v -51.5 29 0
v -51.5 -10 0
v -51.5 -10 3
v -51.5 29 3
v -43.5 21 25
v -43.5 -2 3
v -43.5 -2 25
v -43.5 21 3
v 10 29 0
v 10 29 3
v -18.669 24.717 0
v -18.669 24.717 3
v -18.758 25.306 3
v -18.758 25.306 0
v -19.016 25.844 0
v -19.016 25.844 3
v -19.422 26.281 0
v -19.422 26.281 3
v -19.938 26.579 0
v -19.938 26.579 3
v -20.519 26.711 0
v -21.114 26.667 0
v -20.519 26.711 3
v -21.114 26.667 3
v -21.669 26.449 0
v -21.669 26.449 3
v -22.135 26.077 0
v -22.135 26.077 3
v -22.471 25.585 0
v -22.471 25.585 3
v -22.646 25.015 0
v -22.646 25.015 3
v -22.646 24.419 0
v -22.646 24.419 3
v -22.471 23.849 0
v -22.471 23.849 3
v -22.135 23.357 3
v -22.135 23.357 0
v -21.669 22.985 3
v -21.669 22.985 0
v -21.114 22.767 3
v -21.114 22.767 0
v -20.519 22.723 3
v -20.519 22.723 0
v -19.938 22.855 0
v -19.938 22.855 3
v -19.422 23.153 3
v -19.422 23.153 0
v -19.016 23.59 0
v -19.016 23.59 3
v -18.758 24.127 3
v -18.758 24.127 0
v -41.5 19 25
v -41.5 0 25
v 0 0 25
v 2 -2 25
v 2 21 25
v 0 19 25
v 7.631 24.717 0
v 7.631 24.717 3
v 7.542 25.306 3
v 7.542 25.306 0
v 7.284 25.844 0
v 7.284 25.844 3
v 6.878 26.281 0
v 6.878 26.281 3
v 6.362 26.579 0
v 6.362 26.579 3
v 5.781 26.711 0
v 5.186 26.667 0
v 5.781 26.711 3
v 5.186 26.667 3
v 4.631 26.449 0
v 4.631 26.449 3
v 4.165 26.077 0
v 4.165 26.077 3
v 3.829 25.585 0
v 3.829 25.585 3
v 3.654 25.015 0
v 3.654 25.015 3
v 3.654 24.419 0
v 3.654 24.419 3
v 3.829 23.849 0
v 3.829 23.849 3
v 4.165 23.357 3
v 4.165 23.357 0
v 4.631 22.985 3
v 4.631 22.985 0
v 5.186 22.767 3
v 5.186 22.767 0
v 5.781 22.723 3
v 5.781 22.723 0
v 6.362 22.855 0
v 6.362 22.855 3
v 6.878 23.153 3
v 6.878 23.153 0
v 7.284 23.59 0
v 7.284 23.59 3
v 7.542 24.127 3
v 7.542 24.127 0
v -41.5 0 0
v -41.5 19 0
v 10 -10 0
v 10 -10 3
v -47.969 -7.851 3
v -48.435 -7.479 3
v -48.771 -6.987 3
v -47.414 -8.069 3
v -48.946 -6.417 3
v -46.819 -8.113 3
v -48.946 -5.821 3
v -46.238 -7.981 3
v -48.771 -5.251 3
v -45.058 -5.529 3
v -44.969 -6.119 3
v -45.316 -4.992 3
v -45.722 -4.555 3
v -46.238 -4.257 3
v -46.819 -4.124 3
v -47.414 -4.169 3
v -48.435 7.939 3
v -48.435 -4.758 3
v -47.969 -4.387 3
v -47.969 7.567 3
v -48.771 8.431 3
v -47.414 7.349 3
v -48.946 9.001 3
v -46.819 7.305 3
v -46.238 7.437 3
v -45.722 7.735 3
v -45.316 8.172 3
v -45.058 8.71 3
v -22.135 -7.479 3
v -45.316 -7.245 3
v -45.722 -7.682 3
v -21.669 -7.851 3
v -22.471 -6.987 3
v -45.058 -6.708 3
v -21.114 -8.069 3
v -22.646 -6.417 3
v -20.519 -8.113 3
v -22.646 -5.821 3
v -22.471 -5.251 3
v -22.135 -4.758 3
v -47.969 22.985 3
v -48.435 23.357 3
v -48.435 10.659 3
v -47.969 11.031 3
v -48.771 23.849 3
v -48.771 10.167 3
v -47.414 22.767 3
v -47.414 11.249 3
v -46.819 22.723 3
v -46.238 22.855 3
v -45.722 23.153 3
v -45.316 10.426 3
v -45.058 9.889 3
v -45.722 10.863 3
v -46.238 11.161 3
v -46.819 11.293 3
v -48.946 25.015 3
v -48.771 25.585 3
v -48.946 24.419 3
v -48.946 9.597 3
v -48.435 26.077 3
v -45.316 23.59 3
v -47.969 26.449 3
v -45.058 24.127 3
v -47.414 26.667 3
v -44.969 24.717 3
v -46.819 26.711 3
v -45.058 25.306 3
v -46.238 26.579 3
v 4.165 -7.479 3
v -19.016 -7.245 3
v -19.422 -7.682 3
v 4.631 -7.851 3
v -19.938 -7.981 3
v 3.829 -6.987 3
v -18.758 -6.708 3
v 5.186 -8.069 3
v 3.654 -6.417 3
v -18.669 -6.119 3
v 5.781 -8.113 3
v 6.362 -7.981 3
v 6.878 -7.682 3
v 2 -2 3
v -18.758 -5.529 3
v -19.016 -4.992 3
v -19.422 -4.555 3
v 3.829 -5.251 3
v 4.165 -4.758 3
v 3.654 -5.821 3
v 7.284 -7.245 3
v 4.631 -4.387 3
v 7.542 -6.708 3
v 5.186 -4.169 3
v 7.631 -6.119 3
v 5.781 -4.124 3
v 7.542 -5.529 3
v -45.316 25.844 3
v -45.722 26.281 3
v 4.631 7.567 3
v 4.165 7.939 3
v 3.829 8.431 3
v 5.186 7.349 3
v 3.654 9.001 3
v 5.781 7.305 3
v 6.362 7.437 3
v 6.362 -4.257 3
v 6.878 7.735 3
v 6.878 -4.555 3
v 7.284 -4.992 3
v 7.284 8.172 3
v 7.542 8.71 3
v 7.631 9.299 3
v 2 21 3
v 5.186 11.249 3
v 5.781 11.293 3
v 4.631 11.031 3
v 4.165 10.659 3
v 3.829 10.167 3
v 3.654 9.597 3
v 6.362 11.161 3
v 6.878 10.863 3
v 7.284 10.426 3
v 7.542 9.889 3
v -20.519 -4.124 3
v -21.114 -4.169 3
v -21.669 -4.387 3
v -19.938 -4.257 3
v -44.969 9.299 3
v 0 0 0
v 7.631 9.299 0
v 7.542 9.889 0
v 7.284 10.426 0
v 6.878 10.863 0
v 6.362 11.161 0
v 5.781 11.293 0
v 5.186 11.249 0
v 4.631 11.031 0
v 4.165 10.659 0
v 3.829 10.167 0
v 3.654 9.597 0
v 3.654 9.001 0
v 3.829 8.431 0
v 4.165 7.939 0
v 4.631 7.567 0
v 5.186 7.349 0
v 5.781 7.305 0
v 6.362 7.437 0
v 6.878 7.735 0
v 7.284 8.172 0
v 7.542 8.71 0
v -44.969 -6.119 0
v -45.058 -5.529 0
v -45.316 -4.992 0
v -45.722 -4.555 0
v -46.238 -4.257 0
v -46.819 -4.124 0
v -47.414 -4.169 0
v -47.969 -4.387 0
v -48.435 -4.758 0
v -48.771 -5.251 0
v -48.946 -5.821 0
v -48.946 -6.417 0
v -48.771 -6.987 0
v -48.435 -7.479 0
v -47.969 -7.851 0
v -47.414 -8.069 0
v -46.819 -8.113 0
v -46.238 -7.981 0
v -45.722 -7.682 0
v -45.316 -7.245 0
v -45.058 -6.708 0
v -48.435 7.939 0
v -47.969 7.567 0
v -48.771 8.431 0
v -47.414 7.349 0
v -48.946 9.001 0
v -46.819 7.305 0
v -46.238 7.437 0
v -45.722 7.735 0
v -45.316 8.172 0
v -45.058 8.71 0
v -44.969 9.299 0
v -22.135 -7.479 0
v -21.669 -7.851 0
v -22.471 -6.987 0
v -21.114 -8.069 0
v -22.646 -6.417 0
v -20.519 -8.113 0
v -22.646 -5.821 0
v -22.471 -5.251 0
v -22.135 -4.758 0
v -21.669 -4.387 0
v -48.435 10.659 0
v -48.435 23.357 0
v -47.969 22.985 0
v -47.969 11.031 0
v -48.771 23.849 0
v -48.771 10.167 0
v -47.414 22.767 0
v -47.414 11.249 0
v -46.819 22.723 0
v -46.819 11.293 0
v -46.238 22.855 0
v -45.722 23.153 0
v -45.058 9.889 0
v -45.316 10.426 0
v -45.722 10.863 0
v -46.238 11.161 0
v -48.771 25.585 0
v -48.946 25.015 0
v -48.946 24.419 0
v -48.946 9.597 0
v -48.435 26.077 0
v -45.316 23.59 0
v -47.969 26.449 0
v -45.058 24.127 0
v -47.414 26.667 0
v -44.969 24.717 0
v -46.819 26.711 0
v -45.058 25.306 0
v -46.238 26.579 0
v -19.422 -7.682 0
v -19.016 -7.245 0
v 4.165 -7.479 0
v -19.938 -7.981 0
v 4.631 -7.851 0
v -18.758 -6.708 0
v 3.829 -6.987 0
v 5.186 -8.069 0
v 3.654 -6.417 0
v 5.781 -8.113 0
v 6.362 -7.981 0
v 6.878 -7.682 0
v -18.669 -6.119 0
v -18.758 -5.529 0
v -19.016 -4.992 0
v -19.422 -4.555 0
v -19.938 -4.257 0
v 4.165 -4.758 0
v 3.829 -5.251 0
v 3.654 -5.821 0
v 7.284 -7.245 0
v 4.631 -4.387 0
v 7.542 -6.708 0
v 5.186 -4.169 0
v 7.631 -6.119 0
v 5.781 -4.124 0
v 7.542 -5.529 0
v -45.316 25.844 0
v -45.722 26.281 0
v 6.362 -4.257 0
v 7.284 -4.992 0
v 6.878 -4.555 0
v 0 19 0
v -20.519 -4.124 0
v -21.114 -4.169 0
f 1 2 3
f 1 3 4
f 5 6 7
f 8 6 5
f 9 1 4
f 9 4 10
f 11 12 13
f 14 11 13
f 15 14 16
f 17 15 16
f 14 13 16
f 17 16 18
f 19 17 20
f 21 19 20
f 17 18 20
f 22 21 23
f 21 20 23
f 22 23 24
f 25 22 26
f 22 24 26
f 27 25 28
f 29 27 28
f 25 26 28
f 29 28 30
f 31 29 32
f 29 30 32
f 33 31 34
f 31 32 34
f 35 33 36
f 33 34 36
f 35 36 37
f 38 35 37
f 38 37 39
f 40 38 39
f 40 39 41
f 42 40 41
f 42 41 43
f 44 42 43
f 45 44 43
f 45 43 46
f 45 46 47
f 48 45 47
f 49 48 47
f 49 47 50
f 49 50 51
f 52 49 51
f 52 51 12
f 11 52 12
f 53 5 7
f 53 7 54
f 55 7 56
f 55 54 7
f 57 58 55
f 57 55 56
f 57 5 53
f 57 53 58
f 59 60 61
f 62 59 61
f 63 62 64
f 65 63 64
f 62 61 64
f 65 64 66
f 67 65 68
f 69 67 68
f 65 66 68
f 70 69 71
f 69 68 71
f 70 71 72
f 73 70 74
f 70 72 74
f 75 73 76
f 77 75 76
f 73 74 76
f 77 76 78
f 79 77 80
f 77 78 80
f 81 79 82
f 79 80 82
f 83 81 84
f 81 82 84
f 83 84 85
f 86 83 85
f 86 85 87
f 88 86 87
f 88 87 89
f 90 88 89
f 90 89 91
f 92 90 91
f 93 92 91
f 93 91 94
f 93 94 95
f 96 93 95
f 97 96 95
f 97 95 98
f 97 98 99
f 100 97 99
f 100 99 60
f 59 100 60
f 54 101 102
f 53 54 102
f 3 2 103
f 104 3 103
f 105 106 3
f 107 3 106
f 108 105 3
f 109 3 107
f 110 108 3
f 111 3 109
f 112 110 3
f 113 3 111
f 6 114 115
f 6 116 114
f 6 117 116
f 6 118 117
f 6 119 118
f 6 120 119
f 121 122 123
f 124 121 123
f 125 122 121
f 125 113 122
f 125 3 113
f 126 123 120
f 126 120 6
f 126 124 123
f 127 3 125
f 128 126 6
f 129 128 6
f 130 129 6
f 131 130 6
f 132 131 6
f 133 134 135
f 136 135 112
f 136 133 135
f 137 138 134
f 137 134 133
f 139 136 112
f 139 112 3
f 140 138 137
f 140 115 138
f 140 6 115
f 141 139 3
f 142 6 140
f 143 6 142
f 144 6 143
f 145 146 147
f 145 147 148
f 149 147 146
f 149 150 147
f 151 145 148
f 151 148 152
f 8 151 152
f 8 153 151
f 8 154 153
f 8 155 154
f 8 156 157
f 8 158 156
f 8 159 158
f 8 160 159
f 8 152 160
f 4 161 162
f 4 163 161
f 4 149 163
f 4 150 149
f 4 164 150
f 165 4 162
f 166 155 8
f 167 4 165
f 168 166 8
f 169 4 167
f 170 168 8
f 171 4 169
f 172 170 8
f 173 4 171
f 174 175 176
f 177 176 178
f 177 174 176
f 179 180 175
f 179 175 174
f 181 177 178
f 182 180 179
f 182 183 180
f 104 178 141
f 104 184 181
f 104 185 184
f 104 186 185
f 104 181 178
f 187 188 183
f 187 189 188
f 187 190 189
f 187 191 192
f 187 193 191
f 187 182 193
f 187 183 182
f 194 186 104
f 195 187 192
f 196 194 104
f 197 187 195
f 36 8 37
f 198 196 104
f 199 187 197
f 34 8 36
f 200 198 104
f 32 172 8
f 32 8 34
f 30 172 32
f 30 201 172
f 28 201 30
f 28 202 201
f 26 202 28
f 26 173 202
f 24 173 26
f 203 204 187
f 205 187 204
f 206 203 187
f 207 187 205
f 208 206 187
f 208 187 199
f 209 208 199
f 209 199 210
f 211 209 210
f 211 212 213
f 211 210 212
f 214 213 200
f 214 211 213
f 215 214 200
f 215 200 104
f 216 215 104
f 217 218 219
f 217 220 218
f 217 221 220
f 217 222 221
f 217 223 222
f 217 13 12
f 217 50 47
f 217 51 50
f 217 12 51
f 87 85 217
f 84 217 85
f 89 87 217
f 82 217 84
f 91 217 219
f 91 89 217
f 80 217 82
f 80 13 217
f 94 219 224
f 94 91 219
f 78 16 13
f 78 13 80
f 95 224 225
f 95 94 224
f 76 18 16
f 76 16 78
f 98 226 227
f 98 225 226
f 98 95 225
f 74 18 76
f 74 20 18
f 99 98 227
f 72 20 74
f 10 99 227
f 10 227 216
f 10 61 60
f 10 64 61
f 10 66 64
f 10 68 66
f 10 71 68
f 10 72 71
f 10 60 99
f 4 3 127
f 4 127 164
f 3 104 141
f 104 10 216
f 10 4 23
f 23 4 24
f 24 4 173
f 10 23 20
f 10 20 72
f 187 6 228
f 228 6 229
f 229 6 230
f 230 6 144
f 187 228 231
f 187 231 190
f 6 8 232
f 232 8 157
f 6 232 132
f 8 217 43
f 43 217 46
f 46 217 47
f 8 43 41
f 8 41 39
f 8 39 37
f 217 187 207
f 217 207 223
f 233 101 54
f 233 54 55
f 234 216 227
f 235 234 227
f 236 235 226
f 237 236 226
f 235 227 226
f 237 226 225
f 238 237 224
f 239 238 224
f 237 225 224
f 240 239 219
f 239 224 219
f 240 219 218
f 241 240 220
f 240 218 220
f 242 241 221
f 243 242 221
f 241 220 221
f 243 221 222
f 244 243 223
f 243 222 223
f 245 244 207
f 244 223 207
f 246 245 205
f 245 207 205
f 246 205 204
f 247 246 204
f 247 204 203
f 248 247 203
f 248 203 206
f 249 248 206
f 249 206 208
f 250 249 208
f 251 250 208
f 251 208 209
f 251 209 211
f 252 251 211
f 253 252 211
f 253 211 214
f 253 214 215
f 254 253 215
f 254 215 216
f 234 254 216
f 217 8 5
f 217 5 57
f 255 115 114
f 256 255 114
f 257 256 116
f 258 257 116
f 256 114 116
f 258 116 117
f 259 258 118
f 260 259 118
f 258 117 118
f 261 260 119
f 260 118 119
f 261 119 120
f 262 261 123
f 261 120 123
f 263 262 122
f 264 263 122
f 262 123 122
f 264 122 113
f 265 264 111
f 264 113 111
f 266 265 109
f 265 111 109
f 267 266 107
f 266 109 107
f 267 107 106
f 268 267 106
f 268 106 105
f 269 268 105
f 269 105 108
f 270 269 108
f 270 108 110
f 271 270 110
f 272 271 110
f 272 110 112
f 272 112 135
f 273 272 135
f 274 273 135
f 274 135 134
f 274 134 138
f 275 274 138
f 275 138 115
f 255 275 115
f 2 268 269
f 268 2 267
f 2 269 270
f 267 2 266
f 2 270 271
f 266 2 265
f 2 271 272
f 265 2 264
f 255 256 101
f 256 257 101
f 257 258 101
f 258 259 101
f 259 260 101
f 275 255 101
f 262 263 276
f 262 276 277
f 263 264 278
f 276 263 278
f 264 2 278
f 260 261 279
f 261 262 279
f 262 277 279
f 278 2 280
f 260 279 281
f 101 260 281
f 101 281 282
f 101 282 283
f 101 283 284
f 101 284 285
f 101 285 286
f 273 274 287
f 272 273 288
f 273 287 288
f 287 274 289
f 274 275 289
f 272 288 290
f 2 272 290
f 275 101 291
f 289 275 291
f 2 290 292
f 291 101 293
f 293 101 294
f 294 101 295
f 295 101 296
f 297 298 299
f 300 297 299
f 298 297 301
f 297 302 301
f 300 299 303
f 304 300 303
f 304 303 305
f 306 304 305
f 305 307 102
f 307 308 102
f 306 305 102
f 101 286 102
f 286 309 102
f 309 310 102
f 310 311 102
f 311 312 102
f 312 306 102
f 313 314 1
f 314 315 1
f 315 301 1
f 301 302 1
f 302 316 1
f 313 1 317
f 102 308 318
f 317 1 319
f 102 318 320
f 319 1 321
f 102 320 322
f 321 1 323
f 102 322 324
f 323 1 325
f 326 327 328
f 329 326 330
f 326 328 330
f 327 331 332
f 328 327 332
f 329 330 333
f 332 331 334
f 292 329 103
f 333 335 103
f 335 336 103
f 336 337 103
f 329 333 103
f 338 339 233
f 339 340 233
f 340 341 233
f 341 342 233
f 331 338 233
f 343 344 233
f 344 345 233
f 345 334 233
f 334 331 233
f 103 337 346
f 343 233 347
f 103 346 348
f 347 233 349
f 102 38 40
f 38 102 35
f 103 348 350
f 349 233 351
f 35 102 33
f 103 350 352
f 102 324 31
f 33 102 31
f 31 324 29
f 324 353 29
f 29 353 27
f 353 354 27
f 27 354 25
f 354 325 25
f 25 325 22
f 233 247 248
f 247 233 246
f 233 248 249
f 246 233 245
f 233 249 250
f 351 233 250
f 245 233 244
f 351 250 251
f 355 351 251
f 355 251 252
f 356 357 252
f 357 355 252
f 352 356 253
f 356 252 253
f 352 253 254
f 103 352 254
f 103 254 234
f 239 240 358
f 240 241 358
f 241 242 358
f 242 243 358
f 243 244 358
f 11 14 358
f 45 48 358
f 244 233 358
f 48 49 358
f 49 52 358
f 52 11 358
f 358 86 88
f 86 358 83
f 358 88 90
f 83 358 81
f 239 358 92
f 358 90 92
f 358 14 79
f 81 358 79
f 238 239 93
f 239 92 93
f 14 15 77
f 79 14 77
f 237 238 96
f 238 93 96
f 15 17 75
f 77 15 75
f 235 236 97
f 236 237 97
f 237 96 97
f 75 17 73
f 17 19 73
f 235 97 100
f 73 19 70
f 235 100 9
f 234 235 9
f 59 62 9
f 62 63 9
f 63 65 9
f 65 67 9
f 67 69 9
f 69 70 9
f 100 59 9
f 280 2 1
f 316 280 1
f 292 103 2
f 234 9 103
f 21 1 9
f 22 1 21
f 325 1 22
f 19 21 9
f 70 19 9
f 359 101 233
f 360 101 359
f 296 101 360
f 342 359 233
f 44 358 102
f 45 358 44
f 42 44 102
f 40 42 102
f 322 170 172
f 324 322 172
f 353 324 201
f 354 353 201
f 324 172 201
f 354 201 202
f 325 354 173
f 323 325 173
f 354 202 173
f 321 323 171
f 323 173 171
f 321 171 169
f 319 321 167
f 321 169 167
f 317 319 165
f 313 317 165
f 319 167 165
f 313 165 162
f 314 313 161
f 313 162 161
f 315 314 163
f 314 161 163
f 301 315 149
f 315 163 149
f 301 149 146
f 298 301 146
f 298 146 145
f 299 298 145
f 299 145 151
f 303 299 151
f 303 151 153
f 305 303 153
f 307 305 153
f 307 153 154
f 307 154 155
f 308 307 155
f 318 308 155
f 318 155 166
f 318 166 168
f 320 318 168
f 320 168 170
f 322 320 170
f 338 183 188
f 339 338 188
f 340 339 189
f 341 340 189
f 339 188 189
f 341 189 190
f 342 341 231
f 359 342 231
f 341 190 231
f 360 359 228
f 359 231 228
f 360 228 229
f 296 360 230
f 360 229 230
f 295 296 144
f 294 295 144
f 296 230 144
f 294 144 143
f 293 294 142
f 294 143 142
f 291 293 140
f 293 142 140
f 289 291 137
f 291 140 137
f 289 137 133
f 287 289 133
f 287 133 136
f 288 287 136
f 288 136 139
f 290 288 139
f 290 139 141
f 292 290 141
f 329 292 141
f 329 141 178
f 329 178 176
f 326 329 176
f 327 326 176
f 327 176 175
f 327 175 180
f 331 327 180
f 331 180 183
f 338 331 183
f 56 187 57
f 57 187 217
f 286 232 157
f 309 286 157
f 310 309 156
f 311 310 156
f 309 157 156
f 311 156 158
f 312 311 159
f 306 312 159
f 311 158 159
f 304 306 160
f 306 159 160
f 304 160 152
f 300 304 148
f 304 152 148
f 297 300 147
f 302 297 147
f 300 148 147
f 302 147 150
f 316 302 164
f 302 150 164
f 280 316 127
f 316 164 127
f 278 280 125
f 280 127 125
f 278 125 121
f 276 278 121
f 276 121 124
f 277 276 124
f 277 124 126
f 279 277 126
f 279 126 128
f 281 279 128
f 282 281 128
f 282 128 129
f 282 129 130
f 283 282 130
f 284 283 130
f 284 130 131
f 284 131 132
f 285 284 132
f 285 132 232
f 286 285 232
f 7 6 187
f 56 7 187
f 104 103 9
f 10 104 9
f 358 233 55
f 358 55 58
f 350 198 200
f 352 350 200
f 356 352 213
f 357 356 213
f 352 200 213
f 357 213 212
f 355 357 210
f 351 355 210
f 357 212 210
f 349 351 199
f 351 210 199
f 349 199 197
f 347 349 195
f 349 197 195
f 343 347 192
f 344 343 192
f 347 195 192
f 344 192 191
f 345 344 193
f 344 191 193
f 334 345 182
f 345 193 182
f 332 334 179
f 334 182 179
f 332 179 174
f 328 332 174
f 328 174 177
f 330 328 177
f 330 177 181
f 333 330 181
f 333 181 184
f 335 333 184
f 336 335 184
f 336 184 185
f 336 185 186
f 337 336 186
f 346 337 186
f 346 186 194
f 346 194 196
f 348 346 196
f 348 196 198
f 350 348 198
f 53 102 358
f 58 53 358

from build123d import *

# Parameters (mm, degrees)
F0_W     = 45.5
F0_H     = 23
F0_W_2   = 41.5
F0_H_2   = 19
F1_DEPTH = 25
F0_W_3   = 61.5
F0_H_3   = 39
F2_DEPTH = 3
F3_R     = 2
F4_DEPTH = 3.001


with BuildPart() as f1:
    # F0 (on Top) → F1 (new body)
    with BuildSketch(Plane.XY):
        with Locations((-20.75, 9.5)):
            Rectangle(F0_W, F0_H)
        with Locations((-20.75, 9.5)):
            Rectangle(F0_W_2, F0_H_2, mode=Mode.SUBTRACT)
    extrude(amount=F1_DEPTH)

    # F0 (on Top) → F2 (join)
    with BuildSketch(Plane.XY):
        with Locations((-20.75, 9.5)):
            Rectangle(F0_W_3, F0_H_3)
        with Locations((-20.75, 9.5)):
            Rectangle(F0_W, F0_H, mode=Mode.SUBTRACT)
    extrude(amount=F2_DEPTH)

    # F3 (on face) → F4 (cut, through all)
    with BuildSketch(Plane.XY.offset(3)):
        with Locations((-46.968646, 24.716979)):
            Circle(F3_R)
        with Locations((-20.668646, 24.716979)):
            Circle(F3_R)
        with Locations((5.631354, 24.716979)):
            Circle(F3_R)
        with Locations((-46.968646, 9.299078)):
            Circle(F3_R)
        with Locations((5.631354, 9.299078)):
            Circle(F3_R)
        with Locations((-46.968646, -6.118824)):
            Circle(F3_R)
        with Locations((-20.668646, -6.118824)):
            Circle(F3_R)
        with Locations((5.631354, -6.118824)):
            Circle(F3_R)
    extrude(amount=-F4_DEPTH, mode=Mode.SUBTRACT)


solid = f1.part
